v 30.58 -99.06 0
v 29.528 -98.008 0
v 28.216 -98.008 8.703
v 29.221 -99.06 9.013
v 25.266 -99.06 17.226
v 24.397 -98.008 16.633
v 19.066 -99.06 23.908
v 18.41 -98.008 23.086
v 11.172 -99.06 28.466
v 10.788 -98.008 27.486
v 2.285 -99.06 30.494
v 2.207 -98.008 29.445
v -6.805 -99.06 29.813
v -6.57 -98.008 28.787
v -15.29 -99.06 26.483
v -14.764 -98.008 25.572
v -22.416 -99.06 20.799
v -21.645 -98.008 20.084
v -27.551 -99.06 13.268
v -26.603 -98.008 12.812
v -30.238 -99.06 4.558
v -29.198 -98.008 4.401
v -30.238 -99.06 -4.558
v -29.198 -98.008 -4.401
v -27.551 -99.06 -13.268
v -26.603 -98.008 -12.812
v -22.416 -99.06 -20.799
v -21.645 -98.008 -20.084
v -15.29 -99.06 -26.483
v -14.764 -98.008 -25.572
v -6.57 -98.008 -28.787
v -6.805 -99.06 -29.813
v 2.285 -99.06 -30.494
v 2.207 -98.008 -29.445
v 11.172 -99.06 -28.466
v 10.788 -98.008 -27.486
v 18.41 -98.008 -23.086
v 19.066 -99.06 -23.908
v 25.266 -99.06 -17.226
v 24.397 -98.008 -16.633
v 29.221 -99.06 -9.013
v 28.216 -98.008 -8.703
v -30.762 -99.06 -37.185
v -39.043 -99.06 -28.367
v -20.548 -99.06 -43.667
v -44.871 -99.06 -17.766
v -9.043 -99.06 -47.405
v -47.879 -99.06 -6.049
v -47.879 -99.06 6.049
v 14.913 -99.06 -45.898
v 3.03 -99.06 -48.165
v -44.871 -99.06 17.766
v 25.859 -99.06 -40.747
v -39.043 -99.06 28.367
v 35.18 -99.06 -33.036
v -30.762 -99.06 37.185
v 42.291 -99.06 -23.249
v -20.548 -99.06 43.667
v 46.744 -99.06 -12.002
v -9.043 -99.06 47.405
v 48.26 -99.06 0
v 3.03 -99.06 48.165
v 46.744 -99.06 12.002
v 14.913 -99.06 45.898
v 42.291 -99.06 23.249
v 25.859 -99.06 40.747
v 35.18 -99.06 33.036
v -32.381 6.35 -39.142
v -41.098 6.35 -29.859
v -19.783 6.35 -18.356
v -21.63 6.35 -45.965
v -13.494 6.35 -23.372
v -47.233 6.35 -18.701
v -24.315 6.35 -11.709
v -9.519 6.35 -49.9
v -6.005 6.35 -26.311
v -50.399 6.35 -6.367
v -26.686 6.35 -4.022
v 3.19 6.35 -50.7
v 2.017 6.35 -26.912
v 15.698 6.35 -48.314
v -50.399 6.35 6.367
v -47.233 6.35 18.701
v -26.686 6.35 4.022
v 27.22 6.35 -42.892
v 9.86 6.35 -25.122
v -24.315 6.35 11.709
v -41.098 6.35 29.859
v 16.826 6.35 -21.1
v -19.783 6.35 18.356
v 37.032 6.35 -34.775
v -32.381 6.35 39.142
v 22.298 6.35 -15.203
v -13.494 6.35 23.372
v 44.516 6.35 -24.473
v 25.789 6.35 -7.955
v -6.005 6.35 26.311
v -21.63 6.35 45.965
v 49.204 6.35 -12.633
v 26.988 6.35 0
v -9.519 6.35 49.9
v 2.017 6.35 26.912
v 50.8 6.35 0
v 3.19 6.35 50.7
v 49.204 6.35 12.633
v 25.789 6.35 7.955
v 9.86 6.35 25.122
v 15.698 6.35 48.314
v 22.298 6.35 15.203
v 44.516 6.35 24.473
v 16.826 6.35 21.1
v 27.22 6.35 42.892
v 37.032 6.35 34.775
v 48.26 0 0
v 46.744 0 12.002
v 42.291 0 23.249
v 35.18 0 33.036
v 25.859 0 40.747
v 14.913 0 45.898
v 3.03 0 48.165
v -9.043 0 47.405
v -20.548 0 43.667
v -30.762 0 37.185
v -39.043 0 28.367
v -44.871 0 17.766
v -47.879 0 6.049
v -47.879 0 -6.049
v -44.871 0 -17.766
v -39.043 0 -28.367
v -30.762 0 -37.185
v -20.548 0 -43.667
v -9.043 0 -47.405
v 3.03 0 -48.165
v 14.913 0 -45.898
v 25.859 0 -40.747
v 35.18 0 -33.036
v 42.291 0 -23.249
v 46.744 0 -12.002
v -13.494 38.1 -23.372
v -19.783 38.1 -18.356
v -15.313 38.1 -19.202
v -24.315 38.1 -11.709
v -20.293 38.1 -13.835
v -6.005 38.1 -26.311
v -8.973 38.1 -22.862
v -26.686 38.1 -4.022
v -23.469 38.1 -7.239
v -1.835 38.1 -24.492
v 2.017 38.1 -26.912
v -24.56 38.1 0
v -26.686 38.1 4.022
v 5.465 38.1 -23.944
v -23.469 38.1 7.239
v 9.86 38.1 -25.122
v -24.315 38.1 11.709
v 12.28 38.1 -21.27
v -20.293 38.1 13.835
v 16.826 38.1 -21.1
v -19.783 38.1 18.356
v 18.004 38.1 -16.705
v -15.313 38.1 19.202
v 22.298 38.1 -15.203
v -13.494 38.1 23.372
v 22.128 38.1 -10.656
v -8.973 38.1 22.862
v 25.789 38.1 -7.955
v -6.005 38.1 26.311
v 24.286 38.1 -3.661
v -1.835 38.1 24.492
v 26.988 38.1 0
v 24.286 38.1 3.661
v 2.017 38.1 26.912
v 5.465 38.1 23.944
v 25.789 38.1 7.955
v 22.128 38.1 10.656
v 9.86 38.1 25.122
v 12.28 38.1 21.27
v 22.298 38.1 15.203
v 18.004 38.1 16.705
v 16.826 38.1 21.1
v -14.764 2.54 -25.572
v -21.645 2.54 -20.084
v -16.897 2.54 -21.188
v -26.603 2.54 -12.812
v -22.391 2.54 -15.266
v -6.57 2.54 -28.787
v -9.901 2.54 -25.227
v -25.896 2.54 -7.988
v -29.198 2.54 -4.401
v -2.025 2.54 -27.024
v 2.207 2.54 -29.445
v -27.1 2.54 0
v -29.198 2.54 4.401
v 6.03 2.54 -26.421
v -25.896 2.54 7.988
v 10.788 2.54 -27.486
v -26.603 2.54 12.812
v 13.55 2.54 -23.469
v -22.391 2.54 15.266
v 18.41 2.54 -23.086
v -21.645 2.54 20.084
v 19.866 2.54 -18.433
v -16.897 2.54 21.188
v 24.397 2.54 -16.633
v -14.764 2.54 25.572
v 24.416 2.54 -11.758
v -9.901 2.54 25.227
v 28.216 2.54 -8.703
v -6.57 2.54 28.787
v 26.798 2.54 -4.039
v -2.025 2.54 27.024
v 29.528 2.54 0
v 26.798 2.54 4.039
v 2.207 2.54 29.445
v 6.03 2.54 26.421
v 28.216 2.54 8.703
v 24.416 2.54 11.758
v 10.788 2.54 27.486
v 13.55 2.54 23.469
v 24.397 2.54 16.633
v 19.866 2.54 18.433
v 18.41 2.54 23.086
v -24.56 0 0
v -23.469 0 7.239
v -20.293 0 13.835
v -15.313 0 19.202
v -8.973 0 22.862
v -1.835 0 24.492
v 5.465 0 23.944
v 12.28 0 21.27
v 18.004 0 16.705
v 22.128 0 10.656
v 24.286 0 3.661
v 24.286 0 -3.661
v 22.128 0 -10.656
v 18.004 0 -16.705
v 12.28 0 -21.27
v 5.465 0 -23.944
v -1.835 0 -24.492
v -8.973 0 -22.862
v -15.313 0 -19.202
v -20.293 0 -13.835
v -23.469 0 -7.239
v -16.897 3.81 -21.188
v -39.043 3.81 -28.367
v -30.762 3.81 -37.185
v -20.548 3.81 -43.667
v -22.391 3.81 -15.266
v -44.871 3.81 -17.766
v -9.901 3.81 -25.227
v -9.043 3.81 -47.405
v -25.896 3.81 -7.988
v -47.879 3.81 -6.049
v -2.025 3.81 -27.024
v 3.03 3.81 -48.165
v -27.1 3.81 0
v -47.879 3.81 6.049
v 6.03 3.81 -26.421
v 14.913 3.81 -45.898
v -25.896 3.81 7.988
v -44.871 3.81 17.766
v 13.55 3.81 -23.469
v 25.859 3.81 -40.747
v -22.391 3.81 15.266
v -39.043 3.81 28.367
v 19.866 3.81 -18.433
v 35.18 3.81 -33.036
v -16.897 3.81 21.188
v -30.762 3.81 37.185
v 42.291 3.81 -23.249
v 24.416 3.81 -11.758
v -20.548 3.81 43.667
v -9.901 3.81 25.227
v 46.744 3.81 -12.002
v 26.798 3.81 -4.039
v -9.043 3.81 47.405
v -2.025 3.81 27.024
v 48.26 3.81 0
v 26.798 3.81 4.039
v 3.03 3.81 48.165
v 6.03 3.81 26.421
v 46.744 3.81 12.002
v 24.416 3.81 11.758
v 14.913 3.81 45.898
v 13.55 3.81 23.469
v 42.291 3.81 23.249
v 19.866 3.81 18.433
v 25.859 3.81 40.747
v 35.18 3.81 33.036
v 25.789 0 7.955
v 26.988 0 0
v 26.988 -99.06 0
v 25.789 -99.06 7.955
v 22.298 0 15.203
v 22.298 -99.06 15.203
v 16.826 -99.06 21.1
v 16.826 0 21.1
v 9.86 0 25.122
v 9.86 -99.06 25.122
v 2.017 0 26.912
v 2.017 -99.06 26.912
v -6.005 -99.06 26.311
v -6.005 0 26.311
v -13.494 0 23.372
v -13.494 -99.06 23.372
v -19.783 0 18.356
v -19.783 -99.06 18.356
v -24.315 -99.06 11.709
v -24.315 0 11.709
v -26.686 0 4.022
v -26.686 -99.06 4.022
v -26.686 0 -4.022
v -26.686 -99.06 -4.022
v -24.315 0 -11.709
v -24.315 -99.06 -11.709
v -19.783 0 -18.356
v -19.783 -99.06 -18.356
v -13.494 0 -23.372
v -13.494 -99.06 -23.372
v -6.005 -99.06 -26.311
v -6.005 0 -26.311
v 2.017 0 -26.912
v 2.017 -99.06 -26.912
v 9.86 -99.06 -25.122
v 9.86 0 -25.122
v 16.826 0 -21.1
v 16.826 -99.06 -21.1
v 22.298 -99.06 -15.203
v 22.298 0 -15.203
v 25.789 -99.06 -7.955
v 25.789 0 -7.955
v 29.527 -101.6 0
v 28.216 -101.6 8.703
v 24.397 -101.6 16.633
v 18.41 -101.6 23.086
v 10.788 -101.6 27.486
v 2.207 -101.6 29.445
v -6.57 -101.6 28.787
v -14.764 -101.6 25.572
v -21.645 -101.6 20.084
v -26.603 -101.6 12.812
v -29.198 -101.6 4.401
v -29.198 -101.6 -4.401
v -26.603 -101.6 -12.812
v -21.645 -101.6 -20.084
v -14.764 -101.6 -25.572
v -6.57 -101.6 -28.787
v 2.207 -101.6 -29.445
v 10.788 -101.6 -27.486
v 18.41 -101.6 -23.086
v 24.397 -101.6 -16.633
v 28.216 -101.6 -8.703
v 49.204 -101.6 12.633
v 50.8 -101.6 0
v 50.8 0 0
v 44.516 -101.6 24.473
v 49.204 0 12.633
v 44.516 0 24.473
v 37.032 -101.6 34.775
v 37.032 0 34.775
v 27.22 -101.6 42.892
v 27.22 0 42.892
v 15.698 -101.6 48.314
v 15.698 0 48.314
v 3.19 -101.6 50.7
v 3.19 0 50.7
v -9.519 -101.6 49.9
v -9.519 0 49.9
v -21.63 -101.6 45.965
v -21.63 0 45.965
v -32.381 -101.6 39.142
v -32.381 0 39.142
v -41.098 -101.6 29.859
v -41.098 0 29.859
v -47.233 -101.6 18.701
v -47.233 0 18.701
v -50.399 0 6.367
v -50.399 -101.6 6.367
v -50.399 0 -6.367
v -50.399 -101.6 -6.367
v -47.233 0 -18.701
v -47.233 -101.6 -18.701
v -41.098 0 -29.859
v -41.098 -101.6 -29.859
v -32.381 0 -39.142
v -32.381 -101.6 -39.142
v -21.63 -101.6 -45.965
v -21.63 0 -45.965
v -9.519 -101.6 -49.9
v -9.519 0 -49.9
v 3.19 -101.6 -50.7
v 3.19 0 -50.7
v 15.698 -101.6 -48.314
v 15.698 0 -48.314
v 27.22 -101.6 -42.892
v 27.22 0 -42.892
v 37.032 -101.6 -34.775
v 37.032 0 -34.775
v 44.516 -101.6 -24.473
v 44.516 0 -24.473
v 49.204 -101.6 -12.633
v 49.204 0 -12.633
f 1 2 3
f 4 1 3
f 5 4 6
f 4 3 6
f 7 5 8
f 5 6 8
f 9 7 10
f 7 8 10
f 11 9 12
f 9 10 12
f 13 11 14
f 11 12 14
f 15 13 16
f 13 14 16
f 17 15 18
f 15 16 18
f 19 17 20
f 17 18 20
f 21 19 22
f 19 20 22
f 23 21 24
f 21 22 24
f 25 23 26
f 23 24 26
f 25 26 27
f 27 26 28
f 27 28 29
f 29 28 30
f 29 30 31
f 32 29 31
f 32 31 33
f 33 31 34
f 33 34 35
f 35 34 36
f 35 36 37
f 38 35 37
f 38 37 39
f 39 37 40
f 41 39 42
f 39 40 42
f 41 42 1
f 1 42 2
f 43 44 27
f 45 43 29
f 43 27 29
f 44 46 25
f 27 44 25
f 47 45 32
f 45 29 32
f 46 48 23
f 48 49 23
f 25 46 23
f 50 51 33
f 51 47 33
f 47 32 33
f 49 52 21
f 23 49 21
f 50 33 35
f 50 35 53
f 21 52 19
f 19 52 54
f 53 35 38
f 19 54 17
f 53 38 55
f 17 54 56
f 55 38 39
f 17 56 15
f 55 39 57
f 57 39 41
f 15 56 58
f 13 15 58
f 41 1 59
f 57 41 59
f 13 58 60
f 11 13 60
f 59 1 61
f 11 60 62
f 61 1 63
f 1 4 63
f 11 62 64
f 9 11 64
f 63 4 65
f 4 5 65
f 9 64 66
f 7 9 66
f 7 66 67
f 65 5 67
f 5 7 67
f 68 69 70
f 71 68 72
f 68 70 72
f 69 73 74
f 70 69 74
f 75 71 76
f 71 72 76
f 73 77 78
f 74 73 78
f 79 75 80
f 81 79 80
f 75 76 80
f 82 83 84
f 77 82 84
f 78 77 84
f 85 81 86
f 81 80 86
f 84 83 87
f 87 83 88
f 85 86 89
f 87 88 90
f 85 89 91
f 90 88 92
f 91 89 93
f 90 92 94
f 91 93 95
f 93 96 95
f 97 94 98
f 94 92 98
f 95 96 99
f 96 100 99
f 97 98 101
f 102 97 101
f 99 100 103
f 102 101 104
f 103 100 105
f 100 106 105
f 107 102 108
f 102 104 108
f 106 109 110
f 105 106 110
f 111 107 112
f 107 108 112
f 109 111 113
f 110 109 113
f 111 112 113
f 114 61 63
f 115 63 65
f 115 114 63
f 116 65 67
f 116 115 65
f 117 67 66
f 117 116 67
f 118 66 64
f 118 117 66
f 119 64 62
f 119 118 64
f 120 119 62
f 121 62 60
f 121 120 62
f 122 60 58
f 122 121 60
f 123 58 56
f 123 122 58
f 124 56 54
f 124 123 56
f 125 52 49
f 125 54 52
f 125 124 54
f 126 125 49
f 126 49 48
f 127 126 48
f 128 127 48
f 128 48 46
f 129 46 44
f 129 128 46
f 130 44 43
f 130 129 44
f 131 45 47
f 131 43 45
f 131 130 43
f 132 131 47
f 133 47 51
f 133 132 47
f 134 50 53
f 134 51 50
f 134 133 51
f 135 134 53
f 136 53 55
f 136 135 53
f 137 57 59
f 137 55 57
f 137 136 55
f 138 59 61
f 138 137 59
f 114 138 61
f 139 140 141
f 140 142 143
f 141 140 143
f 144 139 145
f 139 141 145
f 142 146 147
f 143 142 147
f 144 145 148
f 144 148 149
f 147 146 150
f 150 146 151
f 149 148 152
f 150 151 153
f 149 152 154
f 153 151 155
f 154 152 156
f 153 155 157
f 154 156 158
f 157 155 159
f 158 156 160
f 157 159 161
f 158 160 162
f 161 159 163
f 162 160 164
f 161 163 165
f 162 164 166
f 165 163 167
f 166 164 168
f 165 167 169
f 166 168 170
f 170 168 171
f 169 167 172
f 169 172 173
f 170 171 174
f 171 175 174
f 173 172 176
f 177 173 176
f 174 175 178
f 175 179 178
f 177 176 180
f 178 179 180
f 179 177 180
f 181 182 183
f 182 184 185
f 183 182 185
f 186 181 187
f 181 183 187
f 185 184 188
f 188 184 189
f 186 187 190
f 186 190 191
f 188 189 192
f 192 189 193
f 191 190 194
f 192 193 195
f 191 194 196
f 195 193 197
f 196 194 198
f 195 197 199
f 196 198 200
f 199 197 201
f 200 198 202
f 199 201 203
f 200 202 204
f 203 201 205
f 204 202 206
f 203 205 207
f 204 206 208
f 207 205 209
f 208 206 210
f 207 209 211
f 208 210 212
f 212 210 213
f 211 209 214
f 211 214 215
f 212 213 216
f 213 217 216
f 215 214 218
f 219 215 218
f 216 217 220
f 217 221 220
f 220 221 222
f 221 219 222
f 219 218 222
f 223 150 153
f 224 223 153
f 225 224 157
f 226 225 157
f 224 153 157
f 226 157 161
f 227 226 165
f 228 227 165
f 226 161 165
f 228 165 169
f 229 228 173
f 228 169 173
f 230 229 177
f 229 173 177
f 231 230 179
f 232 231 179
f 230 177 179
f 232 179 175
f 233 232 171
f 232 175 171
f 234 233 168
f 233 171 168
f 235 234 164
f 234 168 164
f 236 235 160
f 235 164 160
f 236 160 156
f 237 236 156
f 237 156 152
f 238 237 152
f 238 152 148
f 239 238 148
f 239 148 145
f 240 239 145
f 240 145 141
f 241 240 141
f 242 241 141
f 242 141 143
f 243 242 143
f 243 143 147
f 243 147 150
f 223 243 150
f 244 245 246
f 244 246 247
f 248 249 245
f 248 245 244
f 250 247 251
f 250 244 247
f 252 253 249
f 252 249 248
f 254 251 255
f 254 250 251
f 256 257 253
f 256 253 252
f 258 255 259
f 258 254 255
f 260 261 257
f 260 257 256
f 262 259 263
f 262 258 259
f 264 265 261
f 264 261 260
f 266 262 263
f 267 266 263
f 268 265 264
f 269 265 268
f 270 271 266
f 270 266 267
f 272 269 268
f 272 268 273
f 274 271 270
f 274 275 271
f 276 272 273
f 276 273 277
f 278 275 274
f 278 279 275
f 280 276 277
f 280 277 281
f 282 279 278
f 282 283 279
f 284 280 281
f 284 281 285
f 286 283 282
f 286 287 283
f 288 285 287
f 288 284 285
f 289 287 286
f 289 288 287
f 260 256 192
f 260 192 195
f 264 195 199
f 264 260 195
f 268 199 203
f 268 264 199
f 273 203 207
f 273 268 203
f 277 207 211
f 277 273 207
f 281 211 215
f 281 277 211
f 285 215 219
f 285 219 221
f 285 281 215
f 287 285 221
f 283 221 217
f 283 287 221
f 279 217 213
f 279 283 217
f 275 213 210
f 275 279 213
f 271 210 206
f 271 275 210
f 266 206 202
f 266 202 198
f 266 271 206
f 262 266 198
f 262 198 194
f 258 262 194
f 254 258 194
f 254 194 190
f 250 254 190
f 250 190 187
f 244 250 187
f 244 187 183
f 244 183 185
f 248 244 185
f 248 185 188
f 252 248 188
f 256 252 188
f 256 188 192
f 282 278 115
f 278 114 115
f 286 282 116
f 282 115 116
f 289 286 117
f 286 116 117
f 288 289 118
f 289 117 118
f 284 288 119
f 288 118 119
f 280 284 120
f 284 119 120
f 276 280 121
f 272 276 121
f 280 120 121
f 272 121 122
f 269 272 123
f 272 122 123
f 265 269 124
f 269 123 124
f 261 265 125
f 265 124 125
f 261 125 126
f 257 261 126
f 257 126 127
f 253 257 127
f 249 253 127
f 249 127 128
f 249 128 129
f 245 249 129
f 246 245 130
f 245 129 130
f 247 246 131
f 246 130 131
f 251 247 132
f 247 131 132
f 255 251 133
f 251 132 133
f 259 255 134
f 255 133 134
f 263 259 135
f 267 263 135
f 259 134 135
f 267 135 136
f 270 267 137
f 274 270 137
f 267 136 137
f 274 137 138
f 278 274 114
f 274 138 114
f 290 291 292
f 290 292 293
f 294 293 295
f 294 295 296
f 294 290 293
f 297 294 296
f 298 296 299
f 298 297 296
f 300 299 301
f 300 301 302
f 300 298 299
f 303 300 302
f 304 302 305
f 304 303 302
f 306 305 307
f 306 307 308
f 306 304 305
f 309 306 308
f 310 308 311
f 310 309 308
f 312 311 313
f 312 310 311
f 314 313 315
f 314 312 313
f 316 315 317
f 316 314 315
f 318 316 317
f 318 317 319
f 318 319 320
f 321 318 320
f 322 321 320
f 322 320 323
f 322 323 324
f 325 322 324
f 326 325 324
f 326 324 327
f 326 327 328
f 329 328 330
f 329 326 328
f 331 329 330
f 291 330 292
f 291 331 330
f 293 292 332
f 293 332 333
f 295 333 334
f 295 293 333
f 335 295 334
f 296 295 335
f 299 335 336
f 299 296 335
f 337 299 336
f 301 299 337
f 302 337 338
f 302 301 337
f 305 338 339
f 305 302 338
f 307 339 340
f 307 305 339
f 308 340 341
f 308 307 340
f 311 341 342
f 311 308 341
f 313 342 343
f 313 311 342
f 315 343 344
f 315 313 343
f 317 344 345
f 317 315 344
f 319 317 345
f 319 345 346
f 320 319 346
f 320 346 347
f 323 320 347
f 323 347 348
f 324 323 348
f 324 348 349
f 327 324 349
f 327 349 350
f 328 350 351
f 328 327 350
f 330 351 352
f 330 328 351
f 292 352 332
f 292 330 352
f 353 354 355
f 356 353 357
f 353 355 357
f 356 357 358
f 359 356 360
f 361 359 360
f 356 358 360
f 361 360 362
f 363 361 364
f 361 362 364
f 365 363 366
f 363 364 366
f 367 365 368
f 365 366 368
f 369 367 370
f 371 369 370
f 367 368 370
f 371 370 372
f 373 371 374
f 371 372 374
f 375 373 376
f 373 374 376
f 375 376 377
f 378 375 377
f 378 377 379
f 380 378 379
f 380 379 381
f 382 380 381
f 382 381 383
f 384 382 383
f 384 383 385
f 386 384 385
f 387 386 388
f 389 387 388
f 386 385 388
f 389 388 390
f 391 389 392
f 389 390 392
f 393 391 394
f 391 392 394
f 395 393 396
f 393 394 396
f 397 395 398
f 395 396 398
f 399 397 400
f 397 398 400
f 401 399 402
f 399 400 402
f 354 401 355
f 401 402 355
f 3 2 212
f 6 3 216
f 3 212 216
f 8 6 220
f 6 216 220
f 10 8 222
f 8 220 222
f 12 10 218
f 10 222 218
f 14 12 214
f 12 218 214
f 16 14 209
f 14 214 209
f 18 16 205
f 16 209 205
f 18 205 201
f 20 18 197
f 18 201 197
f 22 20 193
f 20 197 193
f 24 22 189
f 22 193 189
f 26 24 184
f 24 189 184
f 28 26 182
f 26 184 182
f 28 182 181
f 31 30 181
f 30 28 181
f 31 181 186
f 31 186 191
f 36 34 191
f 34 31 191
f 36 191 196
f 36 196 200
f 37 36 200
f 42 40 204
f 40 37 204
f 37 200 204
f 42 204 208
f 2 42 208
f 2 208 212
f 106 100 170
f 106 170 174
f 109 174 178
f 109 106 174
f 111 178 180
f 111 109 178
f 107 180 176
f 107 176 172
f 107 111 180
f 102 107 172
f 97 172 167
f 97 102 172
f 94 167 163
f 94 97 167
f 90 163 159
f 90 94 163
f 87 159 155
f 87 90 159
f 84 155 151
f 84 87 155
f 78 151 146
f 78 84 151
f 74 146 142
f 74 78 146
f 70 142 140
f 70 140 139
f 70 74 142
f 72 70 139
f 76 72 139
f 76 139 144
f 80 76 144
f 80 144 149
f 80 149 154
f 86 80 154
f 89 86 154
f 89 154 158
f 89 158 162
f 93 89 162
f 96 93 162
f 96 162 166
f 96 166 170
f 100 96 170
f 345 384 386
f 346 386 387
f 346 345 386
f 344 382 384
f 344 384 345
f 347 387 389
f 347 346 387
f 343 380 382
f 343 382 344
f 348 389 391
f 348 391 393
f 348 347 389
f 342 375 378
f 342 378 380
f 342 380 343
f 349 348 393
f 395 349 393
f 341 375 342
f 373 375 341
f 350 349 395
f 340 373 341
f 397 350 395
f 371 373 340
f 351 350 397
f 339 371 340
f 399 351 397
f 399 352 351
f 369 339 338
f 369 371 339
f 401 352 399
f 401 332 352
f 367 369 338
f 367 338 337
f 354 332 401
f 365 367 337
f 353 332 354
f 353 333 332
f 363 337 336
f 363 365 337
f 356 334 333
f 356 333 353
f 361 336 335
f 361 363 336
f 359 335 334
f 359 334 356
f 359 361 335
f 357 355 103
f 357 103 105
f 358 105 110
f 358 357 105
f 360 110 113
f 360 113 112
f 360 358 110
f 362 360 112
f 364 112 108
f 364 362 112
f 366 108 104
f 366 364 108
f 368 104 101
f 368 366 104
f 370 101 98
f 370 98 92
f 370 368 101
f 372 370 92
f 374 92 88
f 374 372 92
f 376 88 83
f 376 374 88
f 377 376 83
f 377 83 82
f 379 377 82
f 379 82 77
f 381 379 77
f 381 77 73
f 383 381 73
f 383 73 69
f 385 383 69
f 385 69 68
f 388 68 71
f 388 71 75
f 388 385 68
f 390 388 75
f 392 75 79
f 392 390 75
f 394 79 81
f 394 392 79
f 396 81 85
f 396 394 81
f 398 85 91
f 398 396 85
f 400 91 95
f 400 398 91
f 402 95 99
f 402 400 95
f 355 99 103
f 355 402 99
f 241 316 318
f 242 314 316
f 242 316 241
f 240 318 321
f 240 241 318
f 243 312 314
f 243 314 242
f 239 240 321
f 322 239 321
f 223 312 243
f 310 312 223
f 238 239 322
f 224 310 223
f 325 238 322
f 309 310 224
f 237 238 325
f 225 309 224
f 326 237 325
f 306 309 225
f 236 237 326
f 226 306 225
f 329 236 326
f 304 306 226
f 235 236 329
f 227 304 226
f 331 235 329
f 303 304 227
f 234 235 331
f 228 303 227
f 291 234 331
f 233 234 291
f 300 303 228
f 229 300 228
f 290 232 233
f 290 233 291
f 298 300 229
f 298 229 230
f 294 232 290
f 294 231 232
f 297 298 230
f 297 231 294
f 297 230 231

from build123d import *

# Parameters (mm, degrees)
F0_R     = 26.9875
F1_DEPTH = 38.1
F0_R_2   = 50.8
F2_DEPTH = 6.35
F3_DEPTH = 101.6
F4_R     = 24.5602140896
F5_DEPTH = 127
F6_SIZE2 = 2.54
F6_SIZE  = 2.54
F7_T     = -2.54


# Not quite as in the source:
# - a feature names something its author has since deleted; it is built from what else it names


with BuildPart() as f1:
    # F0 (on Front) → F1 (new body)
    with BuildSketch(Plane.XZ):
        Circle(F0_R)
    extrude(amount=-F1_DEPTH)

    # F0 (on Front) → F2 (join)
    with BuildSketch(Plane.XZ):
        Circle(F0_R_2)
        Circle(F0_R, mode=Mode.SUBTRACT)
    extrude(amount=-F2_DEPTH)

    # F0 (on Front) → F3 (join)
    with BuildSketch(Plane.XZ):
        Circle(F0_R_2)
        Circle(F0_R, mode=Mode.SUBTRACT)
    extrude(amount=F3_DEPTH)

    # F4 (on face) → F5 (cut)
    with BuildSketch(Plane(origin=(0, 38.1, 0), x_dir=(-1, 0, 0), z_dir=(0, 1, 0))):
        Circle(F4_R)
    extrude(amount=-F5_DEPTH, mode=Mode.SUBTRACT)

    # F6
    f6_edges = [f1.edges().sort_by_distance(p)[0] for p in [
        (-26.9875, -101.6, 0),
    ]]
    chamfer(f6_edges, length=F6_SIZE, length2=F6_SIZE2)

    # F7 (hollow: no face is removed)
    offset(amount=F7_T, kind=Kind.INTERSECTION, mode=Mode.SUBTRACT)


solid = f1.part
